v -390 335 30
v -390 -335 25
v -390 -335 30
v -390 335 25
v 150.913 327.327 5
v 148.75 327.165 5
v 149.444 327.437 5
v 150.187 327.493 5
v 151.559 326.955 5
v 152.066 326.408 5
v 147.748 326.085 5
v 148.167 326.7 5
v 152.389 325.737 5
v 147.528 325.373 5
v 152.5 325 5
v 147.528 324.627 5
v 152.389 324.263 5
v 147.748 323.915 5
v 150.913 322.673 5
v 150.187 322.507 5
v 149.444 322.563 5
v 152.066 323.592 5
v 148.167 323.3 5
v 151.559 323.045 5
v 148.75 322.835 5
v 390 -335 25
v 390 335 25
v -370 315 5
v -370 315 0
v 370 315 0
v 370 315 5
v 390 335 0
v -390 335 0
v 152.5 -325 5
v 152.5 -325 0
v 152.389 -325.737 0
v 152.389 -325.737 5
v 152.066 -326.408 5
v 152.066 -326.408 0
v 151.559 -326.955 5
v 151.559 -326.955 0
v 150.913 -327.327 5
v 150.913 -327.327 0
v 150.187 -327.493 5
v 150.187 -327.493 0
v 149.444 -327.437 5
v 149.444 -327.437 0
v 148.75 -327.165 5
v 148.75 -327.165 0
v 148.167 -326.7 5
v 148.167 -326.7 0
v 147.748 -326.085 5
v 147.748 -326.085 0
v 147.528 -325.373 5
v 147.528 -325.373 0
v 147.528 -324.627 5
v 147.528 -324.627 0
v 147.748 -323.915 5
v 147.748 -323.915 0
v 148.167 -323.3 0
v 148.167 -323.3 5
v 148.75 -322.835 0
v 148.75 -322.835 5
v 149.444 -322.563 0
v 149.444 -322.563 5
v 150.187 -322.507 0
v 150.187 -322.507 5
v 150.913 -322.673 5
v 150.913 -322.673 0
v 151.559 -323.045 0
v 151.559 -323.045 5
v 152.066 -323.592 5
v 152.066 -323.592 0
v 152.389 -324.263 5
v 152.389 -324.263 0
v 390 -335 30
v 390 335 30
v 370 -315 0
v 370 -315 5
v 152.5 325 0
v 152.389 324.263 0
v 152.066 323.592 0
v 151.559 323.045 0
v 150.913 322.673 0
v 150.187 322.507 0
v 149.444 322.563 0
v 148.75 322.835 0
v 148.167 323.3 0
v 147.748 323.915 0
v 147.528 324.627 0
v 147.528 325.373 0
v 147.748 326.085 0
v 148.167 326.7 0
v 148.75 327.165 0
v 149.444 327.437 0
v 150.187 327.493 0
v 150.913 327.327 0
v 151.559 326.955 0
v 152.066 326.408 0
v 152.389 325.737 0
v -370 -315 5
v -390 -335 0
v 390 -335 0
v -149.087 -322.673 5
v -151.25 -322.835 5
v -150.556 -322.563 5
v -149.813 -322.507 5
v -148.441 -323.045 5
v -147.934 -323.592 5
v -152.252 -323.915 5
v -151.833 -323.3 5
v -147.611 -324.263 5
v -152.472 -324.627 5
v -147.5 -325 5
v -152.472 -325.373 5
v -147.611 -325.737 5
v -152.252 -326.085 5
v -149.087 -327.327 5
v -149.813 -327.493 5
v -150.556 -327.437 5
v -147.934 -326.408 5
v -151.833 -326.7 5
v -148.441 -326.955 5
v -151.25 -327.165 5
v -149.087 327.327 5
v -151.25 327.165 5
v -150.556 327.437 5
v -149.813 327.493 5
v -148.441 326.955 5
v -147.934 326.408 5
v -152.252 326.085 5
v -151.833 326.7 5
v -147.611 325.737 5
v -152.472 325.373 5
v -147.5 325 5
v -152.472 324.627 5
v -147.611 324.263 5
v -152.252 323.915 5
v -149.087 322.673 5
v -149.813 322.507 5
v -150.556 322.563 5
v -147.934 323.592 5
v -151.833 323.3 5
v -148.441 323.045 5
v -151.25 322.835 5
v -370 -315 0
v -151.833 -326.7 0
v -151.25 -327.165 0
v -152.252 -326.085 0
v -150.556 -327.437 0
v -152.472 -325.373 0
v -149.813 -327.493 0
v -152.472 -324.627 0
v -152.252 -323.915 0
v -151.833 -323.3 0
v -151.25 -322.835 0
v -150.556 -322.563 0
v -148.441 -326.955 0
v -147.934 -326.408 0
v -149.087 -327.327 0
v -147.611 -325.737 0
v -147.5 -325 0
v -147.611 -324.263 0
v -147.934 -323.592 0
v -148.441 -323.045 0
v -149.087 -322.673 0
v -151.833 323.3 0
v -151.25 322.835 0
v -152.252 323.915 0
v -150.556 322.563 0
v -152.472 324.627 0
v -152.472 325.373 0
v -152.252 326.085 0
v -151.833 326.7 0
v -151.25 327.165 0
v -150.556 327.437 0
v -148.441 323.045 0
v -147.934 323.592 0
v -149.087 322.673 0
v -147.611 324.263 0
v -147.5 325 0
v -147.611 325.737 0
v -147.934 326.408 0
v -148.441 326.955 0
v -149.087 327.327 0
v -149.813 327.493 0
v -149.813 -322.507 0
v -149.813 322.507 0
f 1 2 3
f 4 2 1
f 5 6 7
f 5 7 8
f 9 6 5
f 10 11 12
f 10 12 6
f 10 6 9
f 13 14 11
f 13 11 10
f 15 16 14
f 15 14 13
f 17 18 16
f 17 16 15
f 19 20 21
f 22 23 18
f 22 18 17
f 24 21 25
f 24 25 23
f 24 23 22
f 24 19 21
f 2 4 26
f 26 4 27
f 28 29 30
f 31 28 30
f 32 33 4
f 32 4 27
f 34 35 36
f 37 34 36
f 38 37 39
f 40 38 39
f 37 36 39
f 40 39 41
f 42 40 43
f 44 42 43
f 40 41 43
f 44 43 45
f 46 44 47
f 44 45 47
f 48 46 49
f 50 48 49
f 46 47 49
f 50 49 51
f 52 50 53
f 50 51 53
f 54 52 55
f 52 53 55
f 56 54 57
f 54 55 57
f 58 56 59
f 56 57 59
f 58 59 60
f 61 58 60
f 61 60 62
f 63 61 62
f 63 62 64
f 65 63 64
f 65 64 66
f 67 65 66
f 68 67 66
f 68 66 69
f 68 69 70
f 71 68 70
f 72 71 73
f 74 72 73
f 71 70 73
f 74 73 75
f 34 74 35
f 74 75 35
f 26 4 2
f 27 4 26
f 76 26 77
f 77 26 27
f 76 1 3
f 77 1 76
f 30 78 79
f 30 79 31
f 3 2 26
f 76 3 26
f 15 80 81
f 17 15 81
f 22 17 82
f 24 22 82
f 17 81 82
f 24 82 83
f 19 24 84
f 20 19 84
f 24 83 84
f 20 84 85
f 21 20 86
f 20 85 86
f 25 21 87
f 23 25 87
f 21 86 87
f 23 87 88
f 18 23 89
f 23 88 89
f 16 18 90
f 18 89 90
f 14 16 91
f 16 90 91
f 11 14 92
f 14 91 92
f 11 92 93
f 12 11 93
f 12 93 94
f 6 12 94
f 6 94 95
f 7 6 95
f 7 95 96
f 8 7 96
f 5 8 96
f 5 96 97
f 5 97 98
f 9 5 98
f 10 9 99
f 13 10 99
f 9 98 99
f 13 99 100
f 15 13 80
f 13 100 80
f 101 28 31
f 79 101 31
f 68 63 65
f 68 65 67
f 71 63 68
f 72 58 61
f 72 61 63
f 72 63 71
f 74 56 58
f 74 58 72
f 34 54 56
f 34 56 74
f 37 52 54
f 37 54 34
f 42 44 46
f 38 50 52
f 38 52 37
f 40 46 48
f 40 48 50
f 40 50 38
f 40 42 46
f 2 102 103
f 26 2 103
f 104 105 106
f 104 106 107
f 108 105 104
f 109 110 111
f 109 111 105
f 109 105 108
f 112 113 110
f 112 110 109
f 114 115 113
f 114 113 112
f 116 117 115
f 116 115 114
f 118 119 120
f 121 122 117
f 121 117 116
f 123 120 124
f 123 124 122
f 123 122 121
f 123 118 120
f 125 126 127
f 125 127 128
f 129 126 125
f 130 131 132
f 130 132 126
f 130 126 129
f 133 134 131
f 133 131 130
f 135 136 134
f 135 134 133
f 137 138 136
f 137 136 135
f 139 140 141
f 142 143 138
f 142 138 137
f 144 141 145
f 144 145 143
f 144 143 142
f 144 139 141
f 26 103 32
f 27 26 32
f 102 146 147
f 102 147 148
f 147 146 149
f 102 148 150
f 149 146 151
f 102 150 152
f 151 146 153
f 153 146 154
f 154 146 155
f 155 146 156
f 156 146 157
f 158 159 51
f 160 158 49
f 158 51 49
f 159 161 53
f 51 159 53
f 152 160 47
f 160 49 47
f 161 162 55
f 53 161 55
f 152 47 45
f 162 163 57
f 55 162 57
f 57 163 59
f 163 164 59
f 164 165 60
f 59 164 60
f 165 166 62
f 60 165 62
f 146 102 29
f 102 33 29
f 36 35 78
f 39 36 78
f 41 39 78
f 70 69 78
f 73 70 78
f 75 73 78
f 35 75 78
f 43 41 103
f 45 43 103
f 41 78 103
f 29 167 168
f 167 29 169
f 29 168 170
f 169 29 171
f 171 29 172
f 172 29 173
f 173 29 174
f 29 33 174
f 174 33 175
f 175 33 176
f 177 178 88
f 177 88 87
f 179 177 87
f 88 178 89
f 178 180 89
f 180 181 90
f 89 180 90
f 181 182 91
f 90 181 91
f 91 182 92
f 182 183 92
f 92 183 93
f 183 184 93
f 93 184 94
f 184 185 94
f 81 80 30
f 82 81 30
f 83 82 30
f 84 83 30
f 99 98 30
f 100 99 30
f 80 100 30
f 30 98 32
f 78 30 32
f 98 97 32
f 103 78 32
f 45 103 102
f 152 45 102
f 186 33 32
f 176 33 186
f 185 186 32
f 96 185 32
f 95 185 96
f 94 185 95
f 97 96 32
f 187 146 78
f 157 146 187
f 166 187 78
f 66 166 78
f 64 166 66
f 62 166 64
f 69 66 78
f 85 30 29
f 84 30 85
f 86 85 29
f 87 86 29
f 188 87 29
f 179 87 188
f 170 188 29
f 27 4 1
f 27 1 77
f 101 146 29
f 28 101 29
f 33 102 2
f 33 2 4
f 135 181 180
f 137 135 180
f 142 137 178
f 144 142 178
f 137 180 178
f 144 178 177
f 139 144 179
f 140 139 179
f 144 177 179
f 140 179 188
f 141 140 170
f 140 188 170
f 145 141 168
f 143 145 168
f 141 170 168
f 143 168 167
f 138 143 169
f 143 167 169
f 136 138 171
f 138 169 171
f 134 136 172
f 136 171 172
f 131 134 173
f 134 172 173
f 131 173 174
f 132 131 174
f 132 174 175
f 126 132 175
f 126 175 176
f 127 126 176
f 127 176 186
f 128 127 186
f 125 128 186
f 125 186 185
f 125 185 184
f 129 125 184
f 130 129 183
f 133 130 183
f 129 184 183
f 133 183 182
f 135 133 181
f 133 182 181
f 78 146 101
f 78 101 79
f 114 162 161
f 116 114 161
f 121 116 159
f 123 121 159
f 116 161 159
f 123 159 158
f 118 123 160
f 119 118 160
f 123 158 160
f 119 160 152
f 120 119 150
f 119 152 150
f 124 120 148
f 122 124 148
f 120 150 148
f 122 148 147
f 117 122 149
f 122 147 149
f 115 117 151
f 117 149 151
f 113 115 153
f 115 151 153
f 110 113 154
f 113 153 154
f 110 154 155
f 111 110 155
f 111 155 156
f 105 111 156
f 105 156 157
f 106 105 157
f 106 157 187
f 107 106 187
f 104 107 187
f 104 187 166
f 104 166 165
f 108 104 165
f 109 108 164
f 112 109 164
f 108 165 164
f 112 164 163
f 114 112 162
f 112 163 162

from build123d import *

# Parameters (mm, degrees)
F0_W     = 780
F0_H     = 670
F1_DEPTH = 25
F2_T     = -20
F3_R     = 2.5
F4_DEPTH = 5
F5_W     = 780
F5_H     = 670
F6_DEPTH = 5


with BuildPart() as f1:
    # F0 (on Top) → F1 (new body)
    with BuildSketch(Plane.XY):
        Rectangle(F0_W, F0_H)
    extrude(amount=F1_DEPTH)

    # F2
    f2_openings = [f1.faces().sort_by_distance(p)[0] for p in [
        (0, 0, 0),
    ]]
    offset(amount=F2_T, openings=f2_openings)

    # F3 (on face) → F4 (cut)
    with BuildSketch(Plane(origin=(0, 0, 0), x_dir=(1, 0, 0), z_dir=(0, 0, -1))):
        with Locations((-150, 325)):
            Circle(F3_R)
        with Locations((150, 325)):
            Circle(F3_R)
        with Locations((150, -325)):
            Circle(F3_R)
        with Locations((-150, -325)):
            Circle(F3_R)
    extrude(amount=-F4_DEPTH, mode=Mode.SUBTRACT)


with BuildPart() as f6:
    # F5 (on face) → F6 (new body)
    with BuildSketch(Plane.XY.offset(25)):
        Rectangle(F5_W, F5_H)
    extrude(amount=F6_DEPTH)


solid = Compound([f1.part, f6.part])
